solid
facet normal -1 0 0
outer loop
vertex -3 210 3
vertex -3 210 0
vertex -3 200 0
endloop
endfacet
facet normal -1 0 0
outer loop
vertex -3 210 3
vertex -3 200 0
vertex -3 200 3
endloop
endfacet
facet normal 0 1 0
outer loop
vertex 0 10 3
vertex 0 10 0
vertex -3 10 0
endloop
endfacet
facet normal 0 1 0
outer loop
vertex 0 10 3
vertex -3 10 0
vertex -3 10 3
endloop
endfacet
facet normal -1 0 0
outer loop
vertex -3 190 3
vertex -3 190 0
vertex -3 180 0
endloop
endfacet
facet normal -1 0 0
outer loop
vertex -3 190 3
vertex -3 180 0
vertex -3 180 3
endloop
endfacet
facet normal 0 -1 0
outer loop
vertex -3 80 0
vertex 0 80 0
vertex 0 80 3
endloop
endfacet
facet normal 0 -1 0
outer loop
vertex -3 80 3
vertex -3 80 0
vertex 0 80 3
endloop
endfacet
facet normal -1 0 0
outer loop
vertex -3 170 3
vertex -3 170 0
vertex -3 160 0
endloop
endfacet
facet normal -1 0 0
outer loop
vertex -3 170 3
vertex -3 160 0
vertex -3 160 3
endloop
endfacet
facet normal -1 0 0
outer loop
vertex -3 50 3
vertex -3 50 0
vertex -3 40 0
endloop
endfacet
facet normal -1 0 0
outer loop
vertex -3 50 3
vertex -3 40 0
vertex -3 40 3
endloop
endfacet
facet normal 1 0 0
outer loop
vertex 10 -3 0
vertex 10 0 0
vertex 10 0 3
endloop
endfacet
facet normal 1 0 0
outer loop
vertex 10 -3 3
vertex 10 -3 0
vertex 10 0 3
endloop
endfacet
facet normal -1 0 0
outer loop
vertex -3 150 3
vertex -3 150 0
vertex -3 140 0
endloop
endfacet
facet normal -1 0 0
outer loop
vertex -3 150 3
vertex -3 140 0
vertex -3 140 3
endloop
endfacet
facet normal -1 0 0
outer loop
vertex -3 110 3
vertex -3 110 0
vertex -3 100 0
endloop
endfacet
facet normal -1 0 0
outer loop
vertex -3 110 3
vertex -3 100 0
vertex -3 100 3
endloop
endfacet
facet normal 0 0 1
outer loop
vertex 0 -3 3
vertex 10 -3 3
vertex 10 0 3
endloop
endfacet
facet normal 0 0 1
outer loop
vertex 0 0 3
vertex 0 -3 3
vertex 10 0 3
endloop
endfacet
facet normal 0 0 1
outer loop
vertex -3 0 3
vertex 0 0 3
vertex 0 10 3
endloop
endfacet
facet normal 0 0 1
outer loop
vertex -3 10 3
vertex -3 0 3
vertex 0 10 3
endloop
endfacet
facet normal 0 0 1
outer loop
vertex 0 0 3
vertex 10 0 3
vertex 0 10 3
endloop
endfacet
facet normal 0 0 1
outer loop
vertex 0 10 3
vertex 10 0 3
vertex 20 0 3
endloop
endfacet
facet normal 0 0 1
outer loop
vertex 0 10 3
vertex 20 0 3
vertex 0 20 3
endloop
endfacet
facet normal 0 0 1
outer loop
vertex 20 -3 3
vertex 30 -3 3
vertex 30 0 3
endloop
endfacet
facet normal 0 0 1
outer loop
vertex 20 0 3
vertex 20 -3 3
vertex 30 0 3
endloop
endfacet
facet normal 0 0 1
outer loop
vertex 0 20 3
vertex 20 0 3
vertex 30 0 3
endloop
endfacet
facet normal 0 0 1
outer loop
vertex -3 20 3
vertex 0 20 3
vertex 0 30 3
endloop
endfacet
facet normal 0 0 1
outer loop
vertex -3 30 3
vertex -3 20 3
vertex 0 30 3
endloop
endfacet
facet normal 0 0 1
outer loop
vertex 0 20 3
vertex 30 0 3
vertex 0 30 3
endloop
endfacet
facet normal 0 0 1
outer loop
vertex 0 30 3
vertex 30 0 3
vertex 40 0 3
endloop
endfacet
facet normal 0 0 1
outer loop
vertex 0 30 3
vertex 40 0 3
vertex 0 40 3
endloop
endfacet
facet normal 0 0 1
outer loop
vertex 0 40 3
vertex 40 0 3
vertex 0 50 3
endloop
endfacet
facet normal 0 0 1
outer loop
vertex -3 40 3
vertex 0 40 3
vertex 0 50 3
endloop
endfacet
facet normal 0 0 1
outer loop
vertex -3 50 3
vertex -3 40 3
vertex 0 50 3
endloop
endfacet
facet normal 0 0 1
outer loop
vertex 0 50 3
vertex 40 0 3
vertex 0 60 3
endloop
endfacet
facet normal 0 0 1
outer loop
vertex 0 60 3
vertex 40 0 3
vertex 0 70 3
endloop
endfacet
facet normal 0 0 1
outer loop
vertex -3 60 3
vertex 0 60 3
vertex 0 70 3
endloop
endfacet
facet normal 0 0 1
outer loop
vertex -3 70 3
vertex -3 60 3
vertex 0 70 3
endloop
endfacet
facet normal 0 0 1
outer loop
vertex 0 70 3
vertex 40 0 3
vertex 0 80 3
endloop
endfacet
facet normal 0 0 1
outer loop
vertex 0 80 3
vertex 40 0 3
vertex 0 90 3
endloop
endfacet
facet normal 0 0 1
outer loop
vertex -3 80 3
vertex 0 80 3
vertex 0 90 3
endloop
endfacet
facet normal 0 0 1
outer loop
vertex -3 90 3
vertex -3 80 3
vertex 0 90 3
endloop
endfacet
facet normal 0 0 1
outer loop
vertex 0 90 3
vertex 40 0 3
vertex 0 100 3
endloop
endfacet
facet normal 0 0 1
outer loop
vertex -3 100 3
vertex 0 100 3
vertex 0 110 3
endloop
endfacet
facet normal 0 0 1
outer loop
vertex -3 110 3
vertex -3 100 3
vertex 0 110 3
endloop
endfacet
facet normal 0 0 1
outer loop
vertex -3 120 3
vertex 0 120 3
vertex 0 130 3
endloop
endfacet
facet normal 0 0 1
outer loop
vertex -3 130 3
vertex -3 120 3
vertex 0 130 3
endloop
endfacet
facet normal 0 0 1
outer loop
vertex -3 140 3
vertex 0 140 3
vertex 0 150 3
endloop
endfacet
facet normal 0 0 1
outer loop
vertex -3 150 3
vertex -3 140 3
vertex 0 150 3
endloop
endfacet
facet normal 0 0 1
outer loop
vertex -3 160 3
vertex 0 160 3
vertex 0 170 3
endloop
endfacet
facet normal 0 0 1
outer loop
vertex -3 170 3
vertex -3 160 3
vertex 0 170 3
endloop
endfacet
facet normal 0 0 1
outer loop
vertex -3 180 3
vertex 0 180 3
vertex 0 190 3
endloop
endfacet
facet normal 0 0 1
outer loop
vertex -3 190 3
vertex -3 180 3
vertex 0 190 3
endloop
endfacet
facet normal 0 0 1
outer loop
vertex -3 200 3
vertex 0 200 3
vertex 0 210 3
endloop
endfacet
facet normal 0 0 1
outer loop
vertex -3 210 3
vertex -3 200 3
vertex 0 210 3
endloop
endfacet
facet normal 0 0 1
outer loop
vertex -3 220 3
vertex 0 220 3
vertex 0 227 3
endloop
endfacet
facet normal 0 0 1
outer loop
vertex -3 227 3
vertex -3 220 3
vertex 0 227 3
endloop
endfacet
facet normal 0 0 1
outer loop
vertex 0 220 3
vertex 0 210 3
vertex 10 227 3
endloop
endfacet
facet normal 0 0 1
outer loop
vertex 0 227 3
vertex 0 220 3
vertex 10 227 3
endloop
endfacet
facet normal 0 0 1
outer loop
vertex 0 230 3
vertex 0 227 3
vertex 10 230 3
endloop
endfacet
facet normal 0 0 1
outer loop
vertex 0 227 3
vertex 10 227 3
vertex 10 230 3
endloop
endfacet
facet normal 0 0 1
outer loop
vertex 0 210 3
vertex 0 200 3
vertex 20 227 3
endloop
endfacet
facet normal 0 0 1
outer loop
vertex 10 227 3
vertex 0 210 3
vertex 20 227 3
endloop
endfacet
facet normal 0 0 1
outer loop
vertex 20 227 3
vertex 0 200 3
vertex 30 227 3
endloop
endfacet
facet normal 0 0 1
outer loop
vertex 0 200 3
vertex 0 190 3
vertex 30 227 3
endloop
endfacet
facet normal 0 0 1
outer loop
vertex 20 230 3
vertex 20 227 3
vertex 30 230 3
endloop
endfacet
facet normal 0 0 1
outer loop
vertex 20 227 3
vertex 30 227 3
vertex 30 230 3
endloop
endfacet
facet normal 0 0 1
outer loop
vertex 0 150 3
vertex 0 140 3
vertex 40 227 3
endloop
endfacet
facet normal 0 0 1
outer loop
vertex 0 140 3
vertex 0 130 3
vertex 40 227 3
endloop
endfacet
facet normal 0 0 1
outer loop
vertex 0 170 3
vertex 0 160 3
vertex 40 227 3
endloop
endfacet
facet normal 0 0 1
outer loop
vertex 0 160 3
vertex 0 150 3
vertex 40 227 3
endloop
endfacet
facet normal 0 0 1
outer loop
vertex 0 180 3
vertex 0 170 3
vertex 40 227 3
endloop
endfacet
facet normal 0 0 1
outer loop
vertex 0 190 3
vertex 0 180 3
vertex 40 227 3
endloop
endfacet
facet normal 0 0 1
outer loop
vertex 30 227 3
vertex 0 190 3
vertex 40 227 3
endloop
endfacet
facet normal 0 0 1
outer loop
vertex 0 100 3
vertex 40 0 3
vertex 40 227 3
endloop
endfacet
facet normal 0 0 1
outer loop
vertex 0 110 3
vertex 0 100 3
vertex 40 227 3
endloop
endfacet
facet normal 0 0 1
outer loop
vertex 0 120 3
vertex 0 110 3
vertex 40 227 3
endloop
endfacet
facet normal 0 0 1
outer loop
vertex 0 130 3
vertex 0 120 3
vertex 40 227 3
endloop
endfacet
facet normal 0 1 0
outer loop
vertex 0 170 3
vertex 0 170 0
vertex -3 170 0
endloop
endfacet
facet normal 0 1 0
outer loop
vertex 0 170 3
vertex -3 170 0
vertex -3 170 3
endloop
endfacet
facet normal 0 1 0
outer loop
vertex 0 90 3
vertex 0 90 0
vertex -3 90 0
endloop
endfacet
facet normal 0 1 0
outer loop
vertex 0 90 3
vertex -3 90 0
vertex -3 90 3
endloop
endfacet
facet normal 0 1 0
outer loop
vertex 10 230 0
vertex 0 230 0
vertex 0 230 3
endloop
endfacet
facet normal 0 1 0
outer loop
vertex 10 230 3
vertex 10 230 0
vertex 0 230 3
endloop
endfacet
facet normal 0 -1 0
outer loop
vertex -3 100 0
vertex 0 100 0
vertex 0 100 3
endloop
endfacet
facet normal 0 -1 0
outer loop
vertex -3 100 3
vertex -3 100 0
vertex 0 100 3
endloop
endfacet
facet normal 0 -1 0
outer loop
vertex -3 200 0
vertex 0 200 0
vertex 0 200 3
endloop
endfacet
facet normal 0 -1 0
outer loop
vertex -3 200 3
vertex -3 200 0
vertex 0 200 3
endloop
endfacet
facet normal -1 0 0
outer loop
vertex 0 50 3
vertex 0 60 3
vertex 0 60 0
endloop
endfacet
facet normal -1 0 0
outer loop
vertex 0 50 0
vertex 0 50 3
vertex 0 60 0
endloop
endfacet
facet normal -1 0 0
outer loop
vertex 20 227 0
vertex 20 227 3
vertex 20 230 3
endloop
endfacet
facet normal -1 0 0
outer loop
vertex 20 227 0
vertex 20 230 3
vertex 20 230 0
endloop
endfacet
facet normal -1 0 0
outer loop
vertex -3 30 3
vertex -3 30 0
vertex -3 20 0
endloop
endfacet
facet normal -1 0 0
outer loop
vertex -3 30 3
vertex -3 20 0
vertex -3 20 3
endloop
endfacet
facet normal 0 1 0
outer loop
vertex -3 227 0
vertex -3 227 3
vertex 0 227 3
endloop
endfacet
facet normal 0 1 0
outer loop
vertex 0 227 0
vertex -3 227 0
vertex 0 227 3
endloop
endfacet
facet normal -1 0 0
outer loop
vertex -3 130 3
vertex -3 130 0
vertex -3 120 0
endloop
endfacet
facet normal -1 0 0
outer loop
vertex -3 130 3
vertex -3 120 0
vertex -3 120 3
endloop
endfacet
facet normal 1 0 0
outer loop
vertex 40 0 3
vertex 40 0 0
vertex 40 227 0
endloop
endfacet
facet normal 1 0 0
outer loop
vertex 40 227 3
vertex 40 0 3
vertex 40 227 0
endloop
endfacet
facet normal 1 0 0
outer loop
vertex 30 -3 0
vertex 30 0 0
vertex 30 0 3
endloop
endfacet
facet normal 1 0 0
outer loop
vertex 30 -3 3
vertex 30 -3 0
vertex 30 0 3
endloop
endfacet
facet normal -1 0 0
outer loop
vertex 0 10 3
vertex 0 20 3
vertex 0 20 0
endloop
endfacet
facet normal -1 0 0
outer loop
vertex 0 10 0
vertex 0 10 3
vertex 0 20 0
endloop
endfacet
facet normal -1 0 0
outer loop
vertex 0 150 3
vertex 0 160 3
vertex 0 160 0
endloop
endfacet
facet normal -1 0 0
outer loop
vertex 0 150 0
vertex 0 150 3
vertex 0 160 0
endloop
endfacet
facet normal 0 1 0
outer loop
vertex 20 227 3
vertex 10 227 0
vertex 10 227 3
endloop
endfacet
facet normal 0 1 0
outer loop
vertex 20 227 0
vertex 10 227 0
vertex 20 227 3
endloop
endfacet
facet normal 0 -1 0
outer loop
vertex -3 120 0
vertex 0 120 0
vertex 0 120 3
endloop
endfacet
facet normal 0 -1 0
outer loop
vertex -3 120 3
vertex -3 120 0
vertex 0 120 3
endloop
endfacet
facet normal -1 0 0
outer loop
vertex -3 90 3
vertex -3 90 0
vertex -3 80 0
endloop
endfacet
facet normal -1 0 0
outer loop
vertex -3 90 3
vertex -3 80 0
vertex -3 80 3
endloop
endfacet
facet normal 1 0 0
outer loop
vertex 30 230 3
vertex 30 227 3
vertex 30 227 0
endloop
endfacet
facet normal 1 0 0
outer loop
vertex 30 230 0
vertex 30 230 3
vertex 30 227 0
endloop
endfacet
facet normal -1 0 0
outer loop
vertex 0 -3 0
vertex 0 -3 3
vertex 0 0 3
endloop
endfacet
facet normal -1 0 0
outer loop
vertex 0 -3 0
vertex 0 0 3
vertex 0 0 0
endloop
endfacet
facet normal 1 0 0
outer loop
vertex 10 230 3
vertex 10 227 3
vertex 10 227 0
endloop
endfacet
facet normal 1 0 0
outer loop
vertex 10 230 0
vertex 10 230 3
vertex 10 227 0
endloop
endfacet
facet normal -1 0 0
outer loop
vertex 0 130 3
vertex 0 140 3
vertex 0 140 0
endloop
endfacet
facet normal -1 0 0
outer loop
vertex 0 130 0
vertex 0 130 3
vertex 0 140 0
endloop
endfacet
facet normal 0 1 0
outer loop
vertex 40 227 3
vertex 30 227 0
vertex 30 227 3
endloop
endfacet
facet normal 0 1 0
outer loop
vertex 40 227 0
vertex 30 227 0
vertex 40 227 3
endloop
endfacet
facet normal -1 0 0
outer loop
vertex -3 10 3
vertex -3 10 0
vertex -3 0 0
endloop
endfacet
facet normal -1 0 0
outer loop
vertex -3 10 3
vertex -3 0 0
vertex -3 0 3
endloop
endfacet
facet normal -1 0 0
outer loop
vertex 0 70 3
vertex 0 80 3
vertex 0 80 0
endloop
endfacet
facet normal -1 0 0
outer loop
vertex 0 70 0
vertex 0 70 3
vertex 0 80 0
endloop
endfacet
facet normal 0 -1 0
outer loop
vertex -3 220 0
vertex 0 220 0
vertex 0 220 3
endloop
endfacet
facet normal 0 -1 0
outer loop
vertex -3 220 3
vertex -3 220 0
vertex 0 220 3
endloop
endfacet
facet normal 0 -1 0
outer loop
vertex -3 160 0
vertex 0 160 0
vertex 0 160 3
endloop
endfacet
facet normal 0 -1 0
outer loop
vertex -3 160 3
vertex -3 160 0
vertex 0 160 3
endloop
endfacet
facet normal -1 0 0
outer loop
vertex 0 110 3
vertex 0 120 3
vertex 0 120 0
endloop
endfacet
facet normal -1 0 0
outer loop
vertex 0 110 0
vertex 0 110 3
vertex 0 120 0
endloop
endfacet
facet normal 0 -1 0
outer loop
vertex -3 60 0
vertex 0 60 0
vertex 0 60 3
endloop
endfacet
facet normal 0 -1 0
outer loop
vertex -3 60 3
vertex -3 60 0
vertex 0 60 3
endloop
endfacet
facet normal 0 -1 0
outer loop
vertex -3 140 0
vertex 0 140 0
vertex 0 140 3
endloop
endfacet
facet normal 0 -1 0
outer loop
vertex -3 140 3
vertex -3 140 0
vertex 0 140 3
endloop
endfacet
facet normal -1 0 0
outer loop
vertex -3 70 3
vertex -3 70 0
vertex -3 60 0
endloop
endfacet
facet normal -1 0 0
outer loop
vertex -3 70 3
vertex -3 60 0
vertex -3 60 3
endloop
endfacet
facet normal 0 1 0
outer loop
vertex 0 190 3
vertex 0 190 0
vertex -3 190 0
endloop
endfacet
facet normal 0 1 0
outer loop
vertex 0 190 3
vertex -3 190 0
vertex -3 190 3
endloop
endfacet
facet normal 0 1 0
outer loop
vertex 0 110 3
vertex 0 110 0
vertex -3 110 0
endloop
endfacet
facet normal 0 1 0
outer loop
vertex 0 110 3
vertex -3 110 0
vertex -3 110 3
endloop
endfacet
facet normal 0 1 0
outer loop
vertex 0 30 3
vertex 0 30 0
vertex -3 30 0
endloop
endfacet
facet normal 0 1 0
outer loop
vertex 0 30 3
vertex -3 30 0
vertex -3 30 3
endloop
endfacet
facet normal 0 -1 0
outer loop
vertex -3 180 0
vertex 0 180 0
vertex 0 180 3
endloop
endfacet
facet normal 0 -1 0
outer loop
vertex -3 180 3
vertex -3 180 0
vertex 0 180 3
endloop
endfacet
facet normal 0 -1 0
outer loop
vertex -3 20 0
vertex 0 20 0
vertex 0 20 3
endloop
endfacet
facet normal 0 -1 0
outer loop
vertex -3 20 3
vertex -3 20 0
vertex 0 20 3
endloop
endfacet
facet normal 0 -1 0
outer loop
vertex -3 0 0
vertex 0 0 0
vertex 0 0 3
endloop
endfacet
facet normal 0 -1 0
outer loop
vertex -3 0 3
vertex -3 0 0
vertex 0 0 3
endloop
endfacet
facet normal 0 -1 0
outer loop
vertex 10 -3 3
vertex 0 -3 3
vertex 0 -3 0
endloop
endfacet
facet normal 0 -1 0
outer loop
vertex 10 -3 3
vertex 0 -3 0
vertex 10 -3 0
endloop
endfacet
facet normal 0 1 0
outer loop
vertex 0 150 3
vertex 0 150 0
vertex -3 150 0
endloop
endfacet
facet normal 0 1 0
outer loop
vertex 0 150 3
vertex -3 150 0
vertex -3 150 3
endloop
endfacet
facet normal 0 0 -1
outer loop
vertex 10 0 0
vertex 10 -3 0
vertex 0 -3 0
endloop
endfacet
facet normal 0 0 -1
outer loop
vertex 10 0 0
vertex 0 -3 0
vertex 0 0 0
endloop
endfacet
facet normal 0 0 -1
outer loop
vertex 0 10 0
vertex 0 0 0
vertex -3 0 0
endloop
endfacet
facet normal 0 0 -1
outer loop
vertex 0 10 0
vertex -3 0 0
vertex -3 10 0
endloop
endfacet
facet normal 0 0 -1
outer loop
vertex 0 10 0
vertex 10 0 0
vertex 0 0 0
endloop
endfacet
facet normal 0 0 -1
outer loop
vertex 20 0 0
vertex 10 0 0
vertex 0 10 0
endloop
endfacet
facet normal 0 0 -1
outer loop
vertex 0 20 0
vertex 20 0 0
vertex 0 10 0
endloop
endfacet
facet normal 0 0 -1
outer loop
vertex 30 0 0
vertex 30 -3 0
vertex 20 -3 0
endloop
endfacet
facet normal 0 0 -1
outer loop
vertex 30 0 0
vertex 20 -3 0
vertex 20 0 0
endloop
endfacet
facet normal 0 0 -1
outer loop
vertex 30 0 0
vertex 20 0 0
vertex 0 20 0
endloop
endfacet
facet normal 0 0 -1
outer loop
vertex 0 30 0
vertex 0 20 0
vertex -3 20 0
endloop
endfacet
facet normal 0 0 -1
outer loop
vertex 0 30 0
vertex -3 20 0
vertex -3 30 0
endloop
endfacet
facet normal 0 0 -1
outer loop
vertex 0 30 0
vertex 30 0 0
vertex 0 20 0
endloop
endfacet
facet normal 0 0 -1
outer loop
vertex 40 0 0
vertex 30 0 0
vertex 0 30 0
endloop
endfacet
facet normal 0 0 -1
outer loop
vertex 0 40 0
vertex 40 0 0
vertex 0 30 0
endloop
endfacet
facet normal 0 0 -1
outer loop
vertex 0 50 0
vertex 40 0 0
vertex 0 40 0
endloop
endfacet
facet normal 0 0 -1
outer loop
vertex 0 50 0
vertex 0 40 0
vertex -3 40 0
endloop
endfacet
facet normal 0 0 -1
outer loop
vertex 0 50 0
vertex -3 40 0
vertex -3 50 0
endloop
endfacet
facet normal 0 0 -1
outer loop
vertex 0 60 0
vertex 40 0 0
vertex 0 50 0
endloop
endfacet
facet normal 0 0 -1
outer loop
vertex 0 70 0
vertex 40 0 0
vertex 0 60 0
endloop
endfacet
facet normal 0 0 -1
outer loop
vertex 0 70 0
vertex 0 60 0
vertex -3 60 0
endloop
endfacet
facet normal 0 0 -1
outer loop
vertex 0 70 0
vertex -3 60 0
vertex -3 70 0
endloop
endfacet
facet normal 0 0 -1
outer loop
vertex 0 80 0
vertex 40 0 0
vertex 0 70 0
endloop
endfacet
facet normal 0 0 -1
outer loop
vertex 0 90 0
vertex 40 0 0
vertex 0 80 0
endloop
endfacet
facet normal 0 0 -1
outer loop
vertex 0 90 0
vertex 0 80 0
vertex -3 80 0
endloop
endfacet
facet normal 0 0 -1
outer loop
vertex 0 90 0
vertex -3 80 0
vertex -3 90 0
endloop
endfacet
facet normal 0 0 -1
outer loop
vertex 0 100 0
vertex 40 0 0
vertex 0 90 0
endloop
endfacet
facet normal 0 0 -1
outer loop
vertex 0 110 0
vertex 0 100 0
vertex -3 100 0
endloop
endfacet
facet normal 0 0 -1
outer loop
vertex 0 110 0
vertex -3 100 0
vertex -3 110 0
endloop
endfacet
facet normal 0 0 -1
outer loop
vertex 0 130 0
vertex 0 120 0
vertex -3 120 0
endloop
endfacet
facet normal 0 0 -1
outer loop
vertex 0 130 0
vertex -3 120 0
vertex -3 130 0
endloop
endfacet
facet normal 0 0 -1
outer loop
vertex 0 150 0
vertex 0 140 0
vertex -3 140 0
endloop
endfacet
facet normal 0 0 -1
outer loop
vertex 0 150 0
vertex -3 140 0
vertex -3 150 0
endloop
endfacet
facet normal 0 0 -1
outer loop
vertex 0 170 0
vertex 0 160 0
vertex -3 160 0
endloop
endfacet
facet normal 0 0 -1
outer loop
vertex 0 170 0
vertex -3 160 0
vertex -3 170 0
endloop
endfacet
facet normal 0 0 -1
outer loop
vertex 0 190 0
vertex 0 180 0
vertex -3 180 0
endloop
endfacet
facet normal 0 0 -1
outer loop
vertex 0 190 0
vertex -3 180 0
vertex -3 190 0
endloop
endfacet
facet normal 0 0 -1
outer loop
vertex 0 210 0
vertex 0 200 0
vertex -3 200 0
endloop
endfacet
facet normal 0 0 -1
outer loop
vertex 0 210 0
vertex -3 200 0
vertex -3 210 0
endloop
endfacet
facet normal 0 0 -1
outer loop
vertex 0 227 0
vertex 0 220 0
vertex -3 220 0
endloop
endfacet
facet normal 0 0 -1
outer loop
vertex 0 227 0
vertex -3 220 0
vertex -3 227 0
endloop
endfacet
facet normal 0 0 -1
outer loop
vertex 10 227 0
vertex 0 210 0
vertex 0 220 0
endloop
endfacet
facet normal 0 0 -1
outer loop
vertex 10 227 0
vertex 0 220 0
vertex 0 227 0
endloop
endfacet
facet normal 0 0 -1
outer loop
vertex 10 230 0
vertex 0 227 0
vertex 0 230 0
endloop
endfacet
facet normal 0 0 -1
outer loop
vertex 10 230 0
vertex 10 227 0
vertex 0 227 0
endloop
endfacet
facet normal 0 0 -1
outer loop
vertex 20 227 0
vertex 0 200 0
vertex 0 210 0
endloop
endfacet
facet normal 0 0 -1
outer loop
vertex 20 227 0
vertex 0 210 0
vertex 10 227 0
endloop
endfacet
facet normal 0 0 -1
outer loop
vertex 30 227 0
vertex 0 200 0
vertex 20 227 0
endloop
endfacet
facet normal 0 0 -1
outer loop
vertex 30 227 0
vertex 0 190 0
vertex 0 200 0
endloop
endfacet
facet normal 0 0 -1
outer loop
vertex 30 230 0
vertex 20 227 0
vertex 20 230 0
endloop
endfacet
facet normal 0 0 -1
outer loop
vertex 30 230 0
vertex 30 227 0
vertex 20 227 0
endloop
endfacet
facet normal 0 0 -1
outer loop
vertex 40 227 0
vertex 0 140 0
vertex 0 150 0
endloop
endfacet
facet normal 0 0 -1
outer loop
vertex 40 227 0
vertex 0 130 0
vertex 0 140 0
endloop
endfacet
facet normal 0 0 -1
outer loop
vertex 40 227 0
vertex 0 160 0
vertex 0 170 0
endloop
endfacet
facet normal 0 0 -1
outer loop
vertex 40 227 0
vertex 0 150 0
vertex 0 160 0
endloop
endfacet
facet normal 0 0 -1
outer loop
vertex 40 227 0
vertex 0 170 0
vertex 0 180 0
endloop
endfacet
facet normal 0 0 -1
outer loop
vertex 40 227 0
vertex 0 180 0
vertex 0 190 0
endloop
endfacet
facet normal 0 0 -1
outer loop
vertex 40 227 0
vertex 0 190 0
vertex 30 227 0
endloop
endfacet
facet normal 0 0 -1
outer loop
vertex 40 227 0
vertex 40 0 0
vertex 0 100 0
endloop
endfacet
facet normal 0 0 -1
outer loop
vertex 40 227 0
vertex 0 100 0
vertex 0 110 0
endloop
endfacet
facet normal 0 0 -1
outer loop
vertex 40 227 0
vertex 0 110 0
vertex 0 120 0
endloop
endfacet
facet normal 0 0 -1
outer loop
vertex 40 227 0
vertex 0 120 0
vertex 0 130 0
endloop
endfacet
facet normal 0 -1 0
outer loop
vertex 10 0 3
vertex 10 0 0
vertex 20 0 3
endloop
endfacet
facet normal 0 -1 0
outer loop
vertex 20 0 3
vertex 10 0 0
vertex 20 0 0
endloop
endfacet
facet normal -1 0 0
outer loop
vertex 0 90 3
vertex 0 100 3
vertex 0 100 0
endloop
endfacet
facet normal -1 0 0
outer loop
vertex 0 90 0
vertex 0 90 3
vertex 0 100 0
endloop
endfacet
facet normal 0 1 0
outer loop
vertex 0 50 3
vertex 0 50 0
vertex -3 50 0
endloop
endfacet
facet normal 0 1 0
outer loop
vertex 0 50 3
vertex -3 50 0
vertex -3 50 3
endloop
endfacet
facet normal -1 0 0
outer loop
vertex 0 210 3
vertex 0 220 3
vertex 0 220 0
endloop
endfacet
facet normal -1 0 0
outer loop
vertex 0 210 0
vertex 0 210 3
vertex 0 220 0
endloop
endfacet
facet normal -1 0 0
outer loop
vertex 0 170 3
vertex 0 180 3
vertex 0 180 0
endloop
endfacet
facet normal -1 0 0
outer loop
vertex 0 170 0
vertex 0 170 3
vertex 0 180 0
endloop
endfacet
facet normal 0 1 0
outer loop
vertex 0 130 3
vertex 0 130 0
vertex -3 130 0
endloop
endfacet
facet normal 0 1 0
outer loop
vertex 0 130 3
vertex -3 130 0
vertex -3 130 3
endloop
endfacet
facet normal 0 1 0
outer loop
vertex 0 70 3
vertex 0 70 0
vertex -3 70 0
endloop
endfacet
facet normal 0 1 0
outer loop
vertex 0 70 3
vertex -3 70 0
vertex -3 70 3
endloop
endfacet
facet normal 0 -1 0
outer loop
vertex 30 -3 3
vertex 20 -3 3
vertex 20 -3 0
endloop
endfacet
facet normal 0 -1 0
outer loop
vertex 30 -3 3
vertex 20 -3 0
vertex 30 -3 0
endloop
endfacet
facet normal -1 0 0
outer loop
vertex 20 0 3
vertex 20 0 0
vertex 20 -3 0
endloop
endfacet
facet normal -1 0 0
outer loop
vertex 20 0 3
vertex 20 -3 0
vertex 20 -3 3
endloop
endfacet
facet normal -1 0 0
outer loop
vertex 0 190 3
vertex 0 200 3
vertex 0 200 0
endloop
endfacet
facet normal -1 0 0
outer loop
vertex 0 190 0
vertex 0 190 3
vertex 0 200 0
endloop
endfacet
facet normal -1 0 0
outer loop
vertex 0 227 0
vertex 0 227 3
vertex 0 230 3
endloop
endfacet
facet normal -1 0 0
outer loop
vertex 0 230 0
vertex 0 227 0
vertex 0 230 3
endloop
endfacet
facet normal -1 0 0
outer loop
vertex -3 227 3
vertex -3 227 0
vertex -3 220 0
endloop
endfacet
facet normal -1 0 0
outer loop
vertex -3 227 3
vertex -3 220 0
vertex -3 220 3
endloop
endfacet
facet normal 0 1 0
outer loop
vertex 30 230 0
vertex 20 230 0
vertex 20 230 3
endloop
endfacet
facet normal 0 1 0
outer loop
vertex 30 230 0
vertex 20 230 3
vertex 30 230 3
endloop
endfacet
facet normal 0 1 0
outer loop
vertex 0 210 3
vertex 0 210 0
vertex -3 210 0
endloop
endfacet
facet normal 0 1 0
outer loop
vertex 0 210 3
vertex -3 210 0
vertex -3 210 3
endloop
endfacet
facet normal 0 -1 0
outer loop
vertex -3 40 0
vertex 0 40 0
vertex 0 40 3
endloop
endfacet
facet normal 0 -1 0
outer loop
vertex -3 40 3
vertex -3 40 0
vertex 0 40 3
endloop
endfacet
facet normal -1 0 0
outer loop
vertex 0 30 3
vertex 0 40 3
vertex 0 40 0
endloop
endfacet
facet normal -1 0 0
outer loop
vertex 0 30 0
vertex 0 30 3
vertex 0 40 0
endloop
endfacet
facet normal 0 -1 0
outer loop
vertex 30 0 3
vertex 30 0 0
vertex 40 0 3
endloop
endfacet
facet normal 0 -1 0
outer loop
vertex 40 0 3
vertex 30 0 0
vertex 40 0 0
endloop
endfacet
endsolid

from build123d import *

# Parameters (mm, degrees)
SKETCH1_W               = 40
SKETCH1_H               = 227
BOSS_EXTRUDE1_DEPTH     = 3
SKETCH2_W               = 10
SKETCH2_H               = 3
BOSS_EXTRUDE2_DEPTH     = 3
LPATTERN1_COUNT         = 2
LPATTERN1_PITCH         = 20
SKETCH3_W               = 10
SKETCH3_H               = 3
BOSS_EXTRUDE3_DEPTH     = 3
LPATTERN2_COUNT         = 2
LPATTERN2_PITCH         = 20
SKETCH4_W               = 3
SKETCH4_H               = 10
BOSS_EXTRUDE4_DEPTH     = 3
LPATTERN3_COUNT         = 12
LPATTERN3_PITCH         = 20
ESQUISSE1_W             = 3
ESQUISSE1_H             = 3
ENL_V_MAT_EXTRU_1_DEPTH = 4


with BuildPart() as part:
    # Sketch1 → Boss-Extrude1 (new body)
    with BuildSketch(Plane.XY):
        with Locations((20, 113.5)):
            Rectangle(SKETCH1_W, SKETCH1_H)
    extrude(amount=BOSS_EXTRUDE1_DEPTH)

    # Sketch2 → Boss-Extrude2 (add)
    with BuildSketch(Plane.XZ):
        with Locations((25, 1.5)):
            Rectangle(SKETCH2_W, SKETCH2_H)
    boss_extrude2 = extrude(amount=BOSS_EXTRUDE2_DEPTH)

    # LPattern1: Boss-Extrude2 ×2
    with Locations(*[(-i * LPATTERN1_PITCH, 0, 0) for i in range(1, LPATTERN1_COUNT)]):
        add(boss_extrude2)

    # Sketch3 → Boss-Extrude3 (add)
    with BuildSketch(Plane(origin=(0, 227, 0), x_dir=(1, 0, 0), z_dir=(0, 1, 0))):
        with Locations((25, -1.5)):
            Rectangle(SKETCH3_W, SKETCH3_H)
    boss_extrude3 = extrude(amount=BOSS_EXTRUDE3_DEPTH)

    # LPattern2: Boss-Extrude3 ×2
    with Locations(*[(-i * LPATTERN2_PITCH, 0, 0) for i in range(1, LPATTERN2_COUNT)]):
        add(boss_extrude3)

    # Sketch4 → Boss-Extrude4 (add)
    with BuildSketch(Plane.ZY):
        with Locations((1.5, 5)):
            Rectangle(SKETCH4_W, SKETCH4_H)
    boss_extrude4 = extrude(amount=BOSS_EXTRUDE4_DEPTH)

    # LPattern3: Boss-Extrude4 ×12
    with Locations(*[(0, i * LPATTERN3_PITCH, 0) for i in range(1, LPATTERN3_COUNT)]):
        add(boss_extrude4)

    # Esquisse1 → Enlèv. mat.-Extru.1 (cut, through all)
    with BuildSketch(Plane.XY.offset(3)):
        with Locations((-1.5, 228.5)):
            Rectangle(ESQUISSE1_W, ESQUISSE1_H)
    extrude(amount=-ENL_V_MAT_EXTRU_1_DEPTH, mode=Mode.SUBTRACT)


solid = part.part
